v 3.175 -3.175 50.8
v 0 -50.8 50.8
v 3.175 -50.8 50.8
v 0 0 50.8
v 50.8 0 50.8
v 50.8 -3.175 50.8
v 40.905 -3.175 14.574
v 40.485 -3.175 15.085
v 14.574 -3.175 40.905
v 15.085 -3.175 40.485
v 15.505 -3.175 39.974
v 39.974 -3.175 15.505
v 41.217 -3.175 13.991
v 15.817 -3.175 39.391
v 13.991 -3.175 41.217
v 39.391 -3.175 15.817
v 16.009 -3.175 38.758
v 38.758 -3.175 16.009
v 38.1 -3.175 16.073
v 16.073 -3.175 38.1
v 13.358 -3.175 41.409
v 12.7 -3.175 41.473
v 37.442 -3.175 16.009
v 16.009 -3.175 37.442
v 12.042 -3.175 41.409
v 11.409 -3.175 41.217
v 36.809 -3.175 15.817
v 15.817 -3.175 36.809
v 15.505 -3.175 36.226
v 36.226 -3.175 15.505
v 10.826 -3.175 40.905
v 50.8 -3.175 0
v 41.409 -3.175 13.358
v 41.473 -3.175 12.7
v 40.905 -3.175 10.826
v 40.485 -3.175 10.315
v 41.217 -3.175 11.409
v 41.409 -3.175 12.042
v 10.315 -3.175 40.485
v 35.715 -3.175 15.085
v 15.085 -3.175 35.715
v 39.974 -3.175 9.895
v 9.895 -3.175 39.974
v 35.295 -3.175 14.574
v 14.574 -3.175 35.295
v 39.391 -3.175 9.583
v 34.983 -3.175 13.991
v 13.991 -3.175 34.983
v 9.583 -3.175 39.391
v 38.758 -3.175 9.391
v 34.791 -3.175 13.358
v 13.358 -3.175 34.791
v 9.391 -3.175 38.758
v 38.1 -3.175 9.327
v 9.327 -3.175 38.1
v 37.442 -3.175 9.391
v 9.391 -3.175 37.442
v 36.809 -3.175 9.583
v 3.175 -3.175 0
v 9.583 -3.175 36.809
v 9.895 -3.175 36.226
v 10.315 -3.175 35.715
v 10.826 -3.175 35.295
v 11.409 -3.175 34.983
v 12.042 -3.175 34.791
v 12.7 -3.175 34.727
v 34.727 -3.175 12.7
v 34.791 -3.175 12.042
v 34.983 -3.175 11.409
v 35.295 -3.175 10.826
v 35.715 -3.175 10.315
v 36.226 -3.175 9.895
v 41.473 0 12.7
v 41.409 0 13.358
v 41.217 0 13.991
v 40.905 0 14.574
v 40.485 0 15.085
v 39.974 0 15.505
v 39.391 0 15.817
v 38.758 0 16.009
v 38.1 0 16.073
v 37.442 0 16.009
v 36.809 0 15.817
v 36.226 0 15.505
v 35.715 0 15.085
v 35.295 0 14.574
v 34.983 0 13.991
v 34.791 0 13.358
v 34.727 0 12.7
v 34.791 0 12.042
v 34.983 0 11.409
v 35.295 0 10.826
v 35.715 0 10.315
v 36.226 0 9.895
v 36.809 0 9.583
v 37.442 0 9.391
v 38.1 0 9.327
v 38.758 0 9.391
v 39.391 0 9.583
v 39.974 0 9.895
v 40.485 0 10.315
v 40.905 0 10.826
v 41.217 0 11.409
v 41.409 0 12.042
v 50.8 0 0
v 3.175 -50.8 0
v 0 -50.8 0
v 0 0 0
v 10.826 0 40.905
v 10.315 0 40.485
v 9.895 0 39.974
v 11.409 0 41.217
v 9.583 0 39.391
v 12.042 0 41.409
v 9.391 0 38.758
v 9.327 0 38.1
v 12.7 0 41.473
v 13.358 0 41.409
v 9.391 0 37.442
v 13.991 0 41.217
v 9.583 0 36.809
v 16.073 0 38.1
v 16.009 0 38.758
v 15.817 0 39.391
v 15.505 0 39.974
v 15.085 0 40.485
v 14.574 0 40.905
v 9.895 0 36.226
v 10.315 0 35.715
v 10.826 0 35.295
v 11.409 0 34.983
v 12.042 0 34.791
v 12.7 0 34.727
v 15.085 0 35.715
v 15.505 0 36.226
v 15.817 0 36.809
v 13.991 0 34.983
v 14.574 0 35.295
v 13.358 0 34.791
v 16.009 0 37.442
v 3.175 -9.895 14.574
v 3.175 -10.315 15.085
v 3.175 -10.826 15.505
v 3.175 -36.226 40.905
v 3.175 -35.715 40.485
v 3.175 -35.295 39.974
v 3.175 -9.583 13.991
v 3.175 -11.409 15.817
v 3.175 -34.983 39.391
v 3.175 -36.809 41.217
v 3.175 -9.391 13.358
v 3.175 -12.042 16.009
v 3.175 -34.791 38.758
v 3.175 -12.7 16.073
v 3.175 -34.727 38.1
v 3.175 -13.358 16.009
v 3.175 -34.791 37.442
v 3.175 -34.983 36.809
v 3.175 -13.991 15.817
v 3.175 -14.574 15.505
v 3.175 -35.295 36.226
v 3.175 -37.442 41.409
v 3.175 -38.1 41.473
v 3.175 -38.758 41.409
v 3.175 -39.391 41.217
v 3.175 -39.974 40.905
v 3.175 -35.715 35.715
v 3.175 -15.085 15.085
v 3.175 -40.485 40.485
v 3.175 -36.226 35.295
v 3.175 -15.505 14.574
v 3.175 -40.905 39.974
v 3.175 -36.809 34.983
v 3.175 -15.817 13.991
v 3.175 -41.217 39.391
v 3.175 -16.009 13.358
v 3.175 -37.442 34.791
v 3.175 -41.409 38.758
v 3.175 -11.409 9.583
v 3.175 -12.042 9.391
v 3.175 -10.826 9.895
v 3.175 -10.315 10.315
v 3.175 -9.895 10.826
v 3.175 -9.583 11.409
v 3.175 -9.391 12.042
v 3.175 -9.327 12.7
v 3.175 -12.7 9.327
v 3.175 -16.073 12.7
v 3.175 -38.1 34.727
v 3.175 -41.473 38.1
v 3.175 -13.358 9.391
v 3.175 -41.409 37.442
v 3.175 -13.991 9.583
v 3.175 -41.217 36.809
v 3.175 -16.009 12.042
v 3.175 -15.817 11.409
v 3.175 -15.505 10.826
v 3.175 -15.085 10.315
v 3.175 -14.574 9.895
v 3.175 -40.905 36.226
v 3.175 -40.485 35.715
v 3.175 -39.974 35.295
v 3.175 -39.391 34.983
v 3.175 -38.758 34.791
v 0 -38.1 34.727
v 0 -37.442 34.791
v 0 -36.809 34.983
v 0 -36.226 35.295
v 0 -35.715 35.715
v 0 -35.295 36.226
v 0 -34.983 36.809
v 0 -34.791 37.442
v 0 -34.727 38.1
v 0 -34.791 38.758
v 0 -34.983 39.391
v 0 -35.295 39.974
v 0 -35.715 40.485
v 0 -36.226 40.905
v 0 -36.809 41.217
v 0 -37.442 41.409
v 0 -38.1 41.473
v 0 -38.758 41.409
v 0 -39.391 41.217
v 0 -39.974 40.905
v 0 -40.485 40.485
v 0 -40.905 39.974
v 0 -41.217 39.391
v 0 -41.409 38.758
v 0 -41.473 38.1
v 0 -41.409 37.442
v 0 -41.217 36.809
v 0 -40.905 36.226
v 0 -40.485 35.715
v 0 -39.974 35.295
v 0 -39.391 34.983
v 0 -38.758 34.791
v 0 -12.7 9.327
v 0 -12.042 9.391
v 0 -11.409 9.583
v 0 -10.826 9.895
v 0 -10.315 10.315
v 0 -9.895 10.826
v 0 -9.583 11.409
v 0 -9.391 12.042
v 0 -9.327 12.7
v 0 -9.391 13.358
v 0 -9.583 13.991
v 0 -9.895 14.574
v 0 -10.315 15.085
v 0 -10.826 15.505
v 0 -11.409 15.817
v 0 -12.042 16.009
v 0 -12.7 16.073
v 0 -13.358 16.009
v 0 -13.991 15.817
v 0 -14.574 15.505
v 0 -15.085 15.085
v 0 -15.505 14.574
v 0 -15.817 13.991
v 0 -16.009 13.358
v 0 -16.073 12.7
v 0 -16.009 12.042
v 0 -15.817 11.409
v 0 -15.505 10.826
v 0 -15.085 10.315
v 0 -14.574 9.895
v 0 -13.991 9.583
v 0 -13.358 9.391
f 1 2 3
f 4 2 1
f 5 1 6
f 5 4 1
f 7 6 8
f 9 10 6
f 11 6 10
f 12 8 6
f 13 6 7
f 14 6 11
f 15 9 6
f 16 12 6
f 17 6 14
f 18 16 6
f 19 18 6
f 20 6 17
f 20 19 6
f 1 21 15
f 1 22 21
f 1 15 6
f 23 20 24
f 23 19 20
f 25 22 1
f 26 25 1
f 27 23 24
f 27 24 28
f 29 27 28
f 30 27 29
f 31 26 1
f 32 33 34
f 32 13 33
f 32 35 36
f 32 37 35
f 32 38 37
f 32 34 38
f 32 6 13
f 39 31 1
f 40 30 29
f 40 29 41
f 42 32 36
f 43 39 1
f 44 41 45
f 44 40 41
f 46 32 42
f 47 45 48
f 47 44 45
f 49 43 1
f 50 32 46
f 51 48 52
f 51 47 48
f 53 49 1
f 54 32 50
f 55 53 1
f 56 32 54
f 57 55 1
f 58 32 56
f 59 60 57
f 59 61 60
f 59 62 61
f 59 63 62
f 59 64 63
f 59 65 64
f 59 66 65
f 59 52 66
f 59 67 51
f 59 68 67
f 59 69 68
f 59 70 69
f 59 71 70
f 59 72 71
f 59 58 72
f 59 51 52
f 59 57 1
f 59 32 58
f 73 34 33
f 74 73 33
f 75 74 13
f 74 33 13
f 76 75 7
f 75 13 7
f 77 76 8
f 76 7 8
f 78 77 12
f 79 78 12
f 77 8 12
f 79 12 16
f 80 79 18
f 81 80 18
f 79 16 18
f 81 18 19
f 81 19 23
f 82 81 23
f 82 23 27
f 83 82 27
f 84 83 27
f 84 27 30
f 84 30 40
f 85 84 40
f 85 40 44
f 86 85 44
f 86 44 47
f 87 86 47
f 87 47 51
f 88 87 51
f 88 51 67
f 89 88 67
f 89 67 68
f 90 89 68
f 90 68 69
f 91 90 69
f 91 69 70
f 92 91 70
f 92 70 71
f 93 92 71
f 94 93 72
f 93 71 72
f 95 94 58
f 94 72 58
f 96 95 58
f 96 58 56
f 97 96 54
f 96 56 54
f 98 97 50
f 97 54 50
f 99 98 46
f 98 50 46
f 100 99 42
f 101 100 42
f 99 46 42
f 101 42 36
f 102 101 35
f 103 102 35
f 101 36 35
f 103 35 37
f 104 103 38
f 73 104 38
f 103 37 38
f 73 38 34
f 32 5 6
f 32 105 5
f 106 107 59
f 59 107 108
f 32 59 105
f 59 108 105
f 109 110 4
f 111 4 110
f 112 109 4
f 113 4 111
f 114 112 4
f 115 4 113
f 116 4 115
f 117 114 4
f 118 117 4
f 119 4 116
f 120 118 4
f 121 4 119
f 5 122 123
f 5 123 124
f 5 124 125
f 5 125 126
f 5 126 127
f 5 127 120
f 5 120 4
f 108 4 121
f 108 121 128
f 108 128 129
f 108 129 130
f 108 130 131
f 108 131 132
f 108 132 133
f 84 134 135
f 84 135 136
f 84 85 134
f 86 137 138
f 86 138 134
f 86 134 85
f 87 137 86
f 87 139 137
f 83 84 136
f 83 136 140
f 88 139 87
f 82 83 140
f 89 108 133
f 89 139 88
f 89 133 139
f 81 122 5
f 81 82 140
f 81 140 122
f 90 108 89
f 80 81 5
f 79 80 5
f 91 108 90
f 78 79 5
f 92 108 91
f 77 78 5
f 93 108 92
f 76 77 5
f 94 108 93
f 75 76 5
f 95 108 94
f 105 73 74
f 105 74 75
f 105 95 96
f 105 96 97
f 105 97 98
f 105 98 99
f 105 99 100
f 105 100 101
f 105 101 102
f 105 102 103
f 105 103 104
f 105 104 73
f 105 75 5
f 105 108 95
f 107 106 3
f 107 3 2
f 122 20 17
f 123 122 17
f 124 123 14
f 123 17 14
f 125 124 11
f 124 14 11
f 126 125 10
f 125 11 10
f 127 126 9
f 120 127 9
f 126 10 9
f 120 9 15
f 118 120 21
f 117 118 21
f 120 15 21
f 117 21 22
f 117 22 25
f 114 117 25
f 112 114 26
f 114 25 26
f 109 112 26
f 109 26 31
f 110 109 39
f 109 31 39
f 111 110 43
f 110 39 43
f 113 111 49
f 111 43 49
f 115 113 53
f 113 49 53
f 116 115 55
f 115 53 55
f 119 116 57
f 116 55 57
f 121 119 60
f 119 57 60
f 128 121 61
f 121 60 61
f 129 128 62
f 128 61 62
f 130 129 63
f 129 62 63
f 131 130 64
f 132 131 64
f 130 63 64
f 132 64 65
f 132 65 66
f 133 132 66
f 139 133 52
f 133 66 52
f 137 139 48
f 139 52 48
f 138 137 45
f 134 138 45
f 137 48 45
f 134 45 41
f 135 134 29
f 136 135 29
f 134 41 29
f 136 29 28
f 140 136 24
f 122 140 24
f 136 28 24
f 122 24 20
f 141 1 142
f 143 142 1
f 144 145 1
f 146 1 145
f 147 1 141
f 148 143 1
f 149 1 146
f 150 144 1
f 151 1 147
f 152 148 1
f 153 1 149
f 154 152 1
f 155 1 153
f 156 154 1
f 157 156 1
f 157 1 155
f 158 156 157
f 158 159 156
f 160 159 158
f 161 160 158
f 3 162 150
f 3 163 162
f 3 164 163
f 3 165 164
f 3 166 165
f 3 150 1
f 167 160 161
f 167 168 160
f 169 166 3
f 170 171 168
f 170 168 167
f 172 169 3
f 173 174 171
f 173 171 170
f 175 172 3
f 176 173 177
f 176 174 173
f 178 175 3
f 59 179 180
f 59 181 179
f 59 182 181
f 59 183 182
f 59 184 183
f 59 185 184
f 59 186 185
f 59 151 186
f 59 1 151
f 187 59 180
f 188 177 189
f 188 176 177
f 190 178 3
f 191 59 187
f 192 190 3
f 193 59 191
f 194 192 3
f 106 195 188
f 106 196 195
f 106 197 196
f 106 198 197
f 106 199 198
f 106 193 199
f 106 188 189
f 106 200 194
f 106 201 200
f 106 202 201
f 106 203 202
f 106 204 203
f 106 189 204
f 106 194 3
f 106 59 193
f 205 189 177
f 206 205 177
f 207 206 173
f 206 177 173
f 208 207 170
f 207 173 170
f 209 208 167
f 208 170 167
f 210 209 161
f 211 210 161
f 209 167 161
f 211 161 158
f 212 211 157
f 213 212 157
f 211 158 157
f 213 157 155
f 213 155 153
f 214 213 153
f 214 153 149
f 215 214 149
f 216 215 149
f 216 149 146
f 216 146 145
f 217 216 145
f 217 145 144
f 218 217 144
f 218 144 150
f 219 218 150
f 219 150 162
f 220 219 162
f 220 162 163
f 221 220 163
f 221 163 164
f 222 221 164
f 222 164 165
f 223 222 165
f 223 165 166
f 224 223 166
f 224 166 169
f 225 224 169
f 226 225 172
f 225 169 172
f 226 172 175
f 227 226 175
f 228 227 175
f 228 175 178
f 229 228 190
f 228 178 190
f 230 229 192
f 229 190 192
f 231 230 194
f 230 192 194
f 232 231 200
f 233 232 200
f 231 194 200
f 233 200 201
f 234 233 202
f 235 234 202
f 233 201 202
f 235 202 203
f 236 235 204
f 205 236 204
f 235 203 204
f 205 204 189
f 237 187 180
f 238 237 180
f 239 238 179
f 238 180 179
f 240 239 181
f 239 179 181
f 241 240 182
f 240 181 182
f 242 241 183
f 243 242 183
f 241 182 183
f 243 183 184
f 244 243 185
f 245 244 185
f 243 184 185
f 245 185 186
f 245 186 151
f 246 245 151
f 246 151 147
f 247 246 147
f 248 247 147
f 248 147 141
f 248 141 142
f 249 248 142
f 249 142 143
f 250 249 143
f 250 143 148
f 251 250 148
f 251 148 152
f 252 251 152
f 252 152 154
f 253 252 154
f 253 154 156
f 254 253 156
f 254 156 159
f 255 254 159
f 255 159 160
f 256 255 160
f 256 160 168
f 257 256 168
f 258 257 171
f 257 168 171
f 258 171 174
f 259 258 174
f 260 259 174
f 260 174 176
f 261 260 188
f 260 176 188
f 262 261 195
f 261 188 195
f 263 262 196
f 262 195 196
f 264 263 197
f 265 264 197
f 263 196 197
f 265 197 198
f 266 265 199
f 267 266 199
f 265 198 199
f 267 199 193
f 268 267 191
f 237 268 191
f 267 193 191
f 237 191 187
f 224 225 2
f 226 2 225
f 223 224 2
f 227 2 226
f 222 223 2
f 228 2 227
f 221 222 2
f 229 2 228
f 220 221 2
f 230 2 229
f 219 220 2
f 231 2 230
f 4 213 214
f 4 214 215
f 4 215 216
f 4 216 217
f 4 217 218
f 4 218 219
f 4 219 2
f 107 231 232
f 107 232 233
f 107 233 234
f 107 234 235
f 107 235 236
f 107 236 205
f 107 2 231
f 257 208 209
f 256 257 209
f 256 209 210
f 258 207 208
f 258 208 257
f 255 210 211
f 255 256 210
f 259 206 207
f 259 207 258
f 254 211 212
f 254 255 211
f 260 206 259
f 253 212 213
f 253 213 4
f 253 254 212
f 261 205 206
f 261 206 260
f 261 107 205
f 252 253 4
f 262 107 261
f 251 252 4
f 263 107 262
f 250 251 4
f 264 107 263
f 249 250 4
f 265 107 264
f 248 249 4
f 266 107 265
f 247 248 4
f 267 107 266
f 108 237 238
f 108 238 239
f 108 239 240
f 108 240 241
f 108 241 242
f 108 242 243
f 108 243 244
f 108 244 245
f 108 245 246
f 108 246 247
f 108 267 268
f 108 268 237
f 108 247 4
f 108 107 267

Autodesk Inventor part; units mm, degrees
ref_plane "YZ Plane" through (0, 0, 0) normal (1, 0, 0) x (0, 1, 0)
ref_plane "XZ Plane" through (0, 0, 0) normal (0, 1, 0) x (-1, 0, 0)
ref_plane "XY Plane" through (0, 0, 0) normal (0, 0, 1) x (1, 0, 0)
sketch "Sketch1" plane through (0, 0, 0) normal (0, 0, 1) x (1, 0, 0)
  line L0 (0, 0) -> (50.8, 0)
  line L1 (50.8, 0) -> (50.8, -3.175)
  line L2 (50.8, -3.175) -> (3.175, -3.175)
  line L3 (3.175, -3.175) -> (3.175, -50.8)
  line L4 (3.175, -50.8) -> (0, -50.8)
  line L5 (0, -50.8) -> (0, 0)
  dimension "d0" = 50.8
  dimension "d1" = 3.175
  dimension "d2" = 47.625
  dimension "d3" = 47.625
extrude "Extrusion1" add sketch "Sketch1" along normal blind 50.8
sketch "Sketch2" plane through (3.175, -50.8, 0) normal (1, 0, 0) x (0, 0, -1)
  line L0 (0, 50.8) -> (-50.8, 50.8) projected
  circle A0 centre (-38.1, 12.7) radius 3.3734
  circle A1 centre (-12.7, 38.1) radius 3.3734
  line L1 (0, 47.625) -> (0, 0) projected
  point P0 (-50.8, 0)
  dimension "d13" = 38.1
  dimension "d14" = 25.4
  dimension "d15" = 12.7
  dimension "d20" = 6.7469
  dimension "d21" = 6.7469
  dimension "d30" = 38.1
sketch "Sketch3" plane through (3.175, -3.175, 0) normal (0, -1, 0) x (1, 0, 0)
  circle A0 centre (9.525, 38.1) radius 3.3734
  circle A1 centre (34.925, 12.7) radius 3.3734
  line L0 (47.625, 0) -> (0, 0) projected
  line L1 (47.625, 0) -> (47.625, 50.8) projected
  line L2 (0, 50.8) -> (47.625, 50.8) projected
  line L3 (0, 0) -> (0, 50.8) projected
  point P0 (-3.175, 0)
  dimension "d22" = 6.7469
  dimension "d23" = 6.7469
  dimension "d24" = 12.7
  dimension "d25" = 12.7
  dimension "d26" = 12.7
  dimension "d27" = 9.525
extrude "Extrusion4" cut sketch "Sketch3" against normal blind 3.175 contours A0 | A1
extrude "Extrusion5" cut sketch "Sketch2" against normal blind 3.175
properties part number "angle gusset" material "Aluminum 6061"
